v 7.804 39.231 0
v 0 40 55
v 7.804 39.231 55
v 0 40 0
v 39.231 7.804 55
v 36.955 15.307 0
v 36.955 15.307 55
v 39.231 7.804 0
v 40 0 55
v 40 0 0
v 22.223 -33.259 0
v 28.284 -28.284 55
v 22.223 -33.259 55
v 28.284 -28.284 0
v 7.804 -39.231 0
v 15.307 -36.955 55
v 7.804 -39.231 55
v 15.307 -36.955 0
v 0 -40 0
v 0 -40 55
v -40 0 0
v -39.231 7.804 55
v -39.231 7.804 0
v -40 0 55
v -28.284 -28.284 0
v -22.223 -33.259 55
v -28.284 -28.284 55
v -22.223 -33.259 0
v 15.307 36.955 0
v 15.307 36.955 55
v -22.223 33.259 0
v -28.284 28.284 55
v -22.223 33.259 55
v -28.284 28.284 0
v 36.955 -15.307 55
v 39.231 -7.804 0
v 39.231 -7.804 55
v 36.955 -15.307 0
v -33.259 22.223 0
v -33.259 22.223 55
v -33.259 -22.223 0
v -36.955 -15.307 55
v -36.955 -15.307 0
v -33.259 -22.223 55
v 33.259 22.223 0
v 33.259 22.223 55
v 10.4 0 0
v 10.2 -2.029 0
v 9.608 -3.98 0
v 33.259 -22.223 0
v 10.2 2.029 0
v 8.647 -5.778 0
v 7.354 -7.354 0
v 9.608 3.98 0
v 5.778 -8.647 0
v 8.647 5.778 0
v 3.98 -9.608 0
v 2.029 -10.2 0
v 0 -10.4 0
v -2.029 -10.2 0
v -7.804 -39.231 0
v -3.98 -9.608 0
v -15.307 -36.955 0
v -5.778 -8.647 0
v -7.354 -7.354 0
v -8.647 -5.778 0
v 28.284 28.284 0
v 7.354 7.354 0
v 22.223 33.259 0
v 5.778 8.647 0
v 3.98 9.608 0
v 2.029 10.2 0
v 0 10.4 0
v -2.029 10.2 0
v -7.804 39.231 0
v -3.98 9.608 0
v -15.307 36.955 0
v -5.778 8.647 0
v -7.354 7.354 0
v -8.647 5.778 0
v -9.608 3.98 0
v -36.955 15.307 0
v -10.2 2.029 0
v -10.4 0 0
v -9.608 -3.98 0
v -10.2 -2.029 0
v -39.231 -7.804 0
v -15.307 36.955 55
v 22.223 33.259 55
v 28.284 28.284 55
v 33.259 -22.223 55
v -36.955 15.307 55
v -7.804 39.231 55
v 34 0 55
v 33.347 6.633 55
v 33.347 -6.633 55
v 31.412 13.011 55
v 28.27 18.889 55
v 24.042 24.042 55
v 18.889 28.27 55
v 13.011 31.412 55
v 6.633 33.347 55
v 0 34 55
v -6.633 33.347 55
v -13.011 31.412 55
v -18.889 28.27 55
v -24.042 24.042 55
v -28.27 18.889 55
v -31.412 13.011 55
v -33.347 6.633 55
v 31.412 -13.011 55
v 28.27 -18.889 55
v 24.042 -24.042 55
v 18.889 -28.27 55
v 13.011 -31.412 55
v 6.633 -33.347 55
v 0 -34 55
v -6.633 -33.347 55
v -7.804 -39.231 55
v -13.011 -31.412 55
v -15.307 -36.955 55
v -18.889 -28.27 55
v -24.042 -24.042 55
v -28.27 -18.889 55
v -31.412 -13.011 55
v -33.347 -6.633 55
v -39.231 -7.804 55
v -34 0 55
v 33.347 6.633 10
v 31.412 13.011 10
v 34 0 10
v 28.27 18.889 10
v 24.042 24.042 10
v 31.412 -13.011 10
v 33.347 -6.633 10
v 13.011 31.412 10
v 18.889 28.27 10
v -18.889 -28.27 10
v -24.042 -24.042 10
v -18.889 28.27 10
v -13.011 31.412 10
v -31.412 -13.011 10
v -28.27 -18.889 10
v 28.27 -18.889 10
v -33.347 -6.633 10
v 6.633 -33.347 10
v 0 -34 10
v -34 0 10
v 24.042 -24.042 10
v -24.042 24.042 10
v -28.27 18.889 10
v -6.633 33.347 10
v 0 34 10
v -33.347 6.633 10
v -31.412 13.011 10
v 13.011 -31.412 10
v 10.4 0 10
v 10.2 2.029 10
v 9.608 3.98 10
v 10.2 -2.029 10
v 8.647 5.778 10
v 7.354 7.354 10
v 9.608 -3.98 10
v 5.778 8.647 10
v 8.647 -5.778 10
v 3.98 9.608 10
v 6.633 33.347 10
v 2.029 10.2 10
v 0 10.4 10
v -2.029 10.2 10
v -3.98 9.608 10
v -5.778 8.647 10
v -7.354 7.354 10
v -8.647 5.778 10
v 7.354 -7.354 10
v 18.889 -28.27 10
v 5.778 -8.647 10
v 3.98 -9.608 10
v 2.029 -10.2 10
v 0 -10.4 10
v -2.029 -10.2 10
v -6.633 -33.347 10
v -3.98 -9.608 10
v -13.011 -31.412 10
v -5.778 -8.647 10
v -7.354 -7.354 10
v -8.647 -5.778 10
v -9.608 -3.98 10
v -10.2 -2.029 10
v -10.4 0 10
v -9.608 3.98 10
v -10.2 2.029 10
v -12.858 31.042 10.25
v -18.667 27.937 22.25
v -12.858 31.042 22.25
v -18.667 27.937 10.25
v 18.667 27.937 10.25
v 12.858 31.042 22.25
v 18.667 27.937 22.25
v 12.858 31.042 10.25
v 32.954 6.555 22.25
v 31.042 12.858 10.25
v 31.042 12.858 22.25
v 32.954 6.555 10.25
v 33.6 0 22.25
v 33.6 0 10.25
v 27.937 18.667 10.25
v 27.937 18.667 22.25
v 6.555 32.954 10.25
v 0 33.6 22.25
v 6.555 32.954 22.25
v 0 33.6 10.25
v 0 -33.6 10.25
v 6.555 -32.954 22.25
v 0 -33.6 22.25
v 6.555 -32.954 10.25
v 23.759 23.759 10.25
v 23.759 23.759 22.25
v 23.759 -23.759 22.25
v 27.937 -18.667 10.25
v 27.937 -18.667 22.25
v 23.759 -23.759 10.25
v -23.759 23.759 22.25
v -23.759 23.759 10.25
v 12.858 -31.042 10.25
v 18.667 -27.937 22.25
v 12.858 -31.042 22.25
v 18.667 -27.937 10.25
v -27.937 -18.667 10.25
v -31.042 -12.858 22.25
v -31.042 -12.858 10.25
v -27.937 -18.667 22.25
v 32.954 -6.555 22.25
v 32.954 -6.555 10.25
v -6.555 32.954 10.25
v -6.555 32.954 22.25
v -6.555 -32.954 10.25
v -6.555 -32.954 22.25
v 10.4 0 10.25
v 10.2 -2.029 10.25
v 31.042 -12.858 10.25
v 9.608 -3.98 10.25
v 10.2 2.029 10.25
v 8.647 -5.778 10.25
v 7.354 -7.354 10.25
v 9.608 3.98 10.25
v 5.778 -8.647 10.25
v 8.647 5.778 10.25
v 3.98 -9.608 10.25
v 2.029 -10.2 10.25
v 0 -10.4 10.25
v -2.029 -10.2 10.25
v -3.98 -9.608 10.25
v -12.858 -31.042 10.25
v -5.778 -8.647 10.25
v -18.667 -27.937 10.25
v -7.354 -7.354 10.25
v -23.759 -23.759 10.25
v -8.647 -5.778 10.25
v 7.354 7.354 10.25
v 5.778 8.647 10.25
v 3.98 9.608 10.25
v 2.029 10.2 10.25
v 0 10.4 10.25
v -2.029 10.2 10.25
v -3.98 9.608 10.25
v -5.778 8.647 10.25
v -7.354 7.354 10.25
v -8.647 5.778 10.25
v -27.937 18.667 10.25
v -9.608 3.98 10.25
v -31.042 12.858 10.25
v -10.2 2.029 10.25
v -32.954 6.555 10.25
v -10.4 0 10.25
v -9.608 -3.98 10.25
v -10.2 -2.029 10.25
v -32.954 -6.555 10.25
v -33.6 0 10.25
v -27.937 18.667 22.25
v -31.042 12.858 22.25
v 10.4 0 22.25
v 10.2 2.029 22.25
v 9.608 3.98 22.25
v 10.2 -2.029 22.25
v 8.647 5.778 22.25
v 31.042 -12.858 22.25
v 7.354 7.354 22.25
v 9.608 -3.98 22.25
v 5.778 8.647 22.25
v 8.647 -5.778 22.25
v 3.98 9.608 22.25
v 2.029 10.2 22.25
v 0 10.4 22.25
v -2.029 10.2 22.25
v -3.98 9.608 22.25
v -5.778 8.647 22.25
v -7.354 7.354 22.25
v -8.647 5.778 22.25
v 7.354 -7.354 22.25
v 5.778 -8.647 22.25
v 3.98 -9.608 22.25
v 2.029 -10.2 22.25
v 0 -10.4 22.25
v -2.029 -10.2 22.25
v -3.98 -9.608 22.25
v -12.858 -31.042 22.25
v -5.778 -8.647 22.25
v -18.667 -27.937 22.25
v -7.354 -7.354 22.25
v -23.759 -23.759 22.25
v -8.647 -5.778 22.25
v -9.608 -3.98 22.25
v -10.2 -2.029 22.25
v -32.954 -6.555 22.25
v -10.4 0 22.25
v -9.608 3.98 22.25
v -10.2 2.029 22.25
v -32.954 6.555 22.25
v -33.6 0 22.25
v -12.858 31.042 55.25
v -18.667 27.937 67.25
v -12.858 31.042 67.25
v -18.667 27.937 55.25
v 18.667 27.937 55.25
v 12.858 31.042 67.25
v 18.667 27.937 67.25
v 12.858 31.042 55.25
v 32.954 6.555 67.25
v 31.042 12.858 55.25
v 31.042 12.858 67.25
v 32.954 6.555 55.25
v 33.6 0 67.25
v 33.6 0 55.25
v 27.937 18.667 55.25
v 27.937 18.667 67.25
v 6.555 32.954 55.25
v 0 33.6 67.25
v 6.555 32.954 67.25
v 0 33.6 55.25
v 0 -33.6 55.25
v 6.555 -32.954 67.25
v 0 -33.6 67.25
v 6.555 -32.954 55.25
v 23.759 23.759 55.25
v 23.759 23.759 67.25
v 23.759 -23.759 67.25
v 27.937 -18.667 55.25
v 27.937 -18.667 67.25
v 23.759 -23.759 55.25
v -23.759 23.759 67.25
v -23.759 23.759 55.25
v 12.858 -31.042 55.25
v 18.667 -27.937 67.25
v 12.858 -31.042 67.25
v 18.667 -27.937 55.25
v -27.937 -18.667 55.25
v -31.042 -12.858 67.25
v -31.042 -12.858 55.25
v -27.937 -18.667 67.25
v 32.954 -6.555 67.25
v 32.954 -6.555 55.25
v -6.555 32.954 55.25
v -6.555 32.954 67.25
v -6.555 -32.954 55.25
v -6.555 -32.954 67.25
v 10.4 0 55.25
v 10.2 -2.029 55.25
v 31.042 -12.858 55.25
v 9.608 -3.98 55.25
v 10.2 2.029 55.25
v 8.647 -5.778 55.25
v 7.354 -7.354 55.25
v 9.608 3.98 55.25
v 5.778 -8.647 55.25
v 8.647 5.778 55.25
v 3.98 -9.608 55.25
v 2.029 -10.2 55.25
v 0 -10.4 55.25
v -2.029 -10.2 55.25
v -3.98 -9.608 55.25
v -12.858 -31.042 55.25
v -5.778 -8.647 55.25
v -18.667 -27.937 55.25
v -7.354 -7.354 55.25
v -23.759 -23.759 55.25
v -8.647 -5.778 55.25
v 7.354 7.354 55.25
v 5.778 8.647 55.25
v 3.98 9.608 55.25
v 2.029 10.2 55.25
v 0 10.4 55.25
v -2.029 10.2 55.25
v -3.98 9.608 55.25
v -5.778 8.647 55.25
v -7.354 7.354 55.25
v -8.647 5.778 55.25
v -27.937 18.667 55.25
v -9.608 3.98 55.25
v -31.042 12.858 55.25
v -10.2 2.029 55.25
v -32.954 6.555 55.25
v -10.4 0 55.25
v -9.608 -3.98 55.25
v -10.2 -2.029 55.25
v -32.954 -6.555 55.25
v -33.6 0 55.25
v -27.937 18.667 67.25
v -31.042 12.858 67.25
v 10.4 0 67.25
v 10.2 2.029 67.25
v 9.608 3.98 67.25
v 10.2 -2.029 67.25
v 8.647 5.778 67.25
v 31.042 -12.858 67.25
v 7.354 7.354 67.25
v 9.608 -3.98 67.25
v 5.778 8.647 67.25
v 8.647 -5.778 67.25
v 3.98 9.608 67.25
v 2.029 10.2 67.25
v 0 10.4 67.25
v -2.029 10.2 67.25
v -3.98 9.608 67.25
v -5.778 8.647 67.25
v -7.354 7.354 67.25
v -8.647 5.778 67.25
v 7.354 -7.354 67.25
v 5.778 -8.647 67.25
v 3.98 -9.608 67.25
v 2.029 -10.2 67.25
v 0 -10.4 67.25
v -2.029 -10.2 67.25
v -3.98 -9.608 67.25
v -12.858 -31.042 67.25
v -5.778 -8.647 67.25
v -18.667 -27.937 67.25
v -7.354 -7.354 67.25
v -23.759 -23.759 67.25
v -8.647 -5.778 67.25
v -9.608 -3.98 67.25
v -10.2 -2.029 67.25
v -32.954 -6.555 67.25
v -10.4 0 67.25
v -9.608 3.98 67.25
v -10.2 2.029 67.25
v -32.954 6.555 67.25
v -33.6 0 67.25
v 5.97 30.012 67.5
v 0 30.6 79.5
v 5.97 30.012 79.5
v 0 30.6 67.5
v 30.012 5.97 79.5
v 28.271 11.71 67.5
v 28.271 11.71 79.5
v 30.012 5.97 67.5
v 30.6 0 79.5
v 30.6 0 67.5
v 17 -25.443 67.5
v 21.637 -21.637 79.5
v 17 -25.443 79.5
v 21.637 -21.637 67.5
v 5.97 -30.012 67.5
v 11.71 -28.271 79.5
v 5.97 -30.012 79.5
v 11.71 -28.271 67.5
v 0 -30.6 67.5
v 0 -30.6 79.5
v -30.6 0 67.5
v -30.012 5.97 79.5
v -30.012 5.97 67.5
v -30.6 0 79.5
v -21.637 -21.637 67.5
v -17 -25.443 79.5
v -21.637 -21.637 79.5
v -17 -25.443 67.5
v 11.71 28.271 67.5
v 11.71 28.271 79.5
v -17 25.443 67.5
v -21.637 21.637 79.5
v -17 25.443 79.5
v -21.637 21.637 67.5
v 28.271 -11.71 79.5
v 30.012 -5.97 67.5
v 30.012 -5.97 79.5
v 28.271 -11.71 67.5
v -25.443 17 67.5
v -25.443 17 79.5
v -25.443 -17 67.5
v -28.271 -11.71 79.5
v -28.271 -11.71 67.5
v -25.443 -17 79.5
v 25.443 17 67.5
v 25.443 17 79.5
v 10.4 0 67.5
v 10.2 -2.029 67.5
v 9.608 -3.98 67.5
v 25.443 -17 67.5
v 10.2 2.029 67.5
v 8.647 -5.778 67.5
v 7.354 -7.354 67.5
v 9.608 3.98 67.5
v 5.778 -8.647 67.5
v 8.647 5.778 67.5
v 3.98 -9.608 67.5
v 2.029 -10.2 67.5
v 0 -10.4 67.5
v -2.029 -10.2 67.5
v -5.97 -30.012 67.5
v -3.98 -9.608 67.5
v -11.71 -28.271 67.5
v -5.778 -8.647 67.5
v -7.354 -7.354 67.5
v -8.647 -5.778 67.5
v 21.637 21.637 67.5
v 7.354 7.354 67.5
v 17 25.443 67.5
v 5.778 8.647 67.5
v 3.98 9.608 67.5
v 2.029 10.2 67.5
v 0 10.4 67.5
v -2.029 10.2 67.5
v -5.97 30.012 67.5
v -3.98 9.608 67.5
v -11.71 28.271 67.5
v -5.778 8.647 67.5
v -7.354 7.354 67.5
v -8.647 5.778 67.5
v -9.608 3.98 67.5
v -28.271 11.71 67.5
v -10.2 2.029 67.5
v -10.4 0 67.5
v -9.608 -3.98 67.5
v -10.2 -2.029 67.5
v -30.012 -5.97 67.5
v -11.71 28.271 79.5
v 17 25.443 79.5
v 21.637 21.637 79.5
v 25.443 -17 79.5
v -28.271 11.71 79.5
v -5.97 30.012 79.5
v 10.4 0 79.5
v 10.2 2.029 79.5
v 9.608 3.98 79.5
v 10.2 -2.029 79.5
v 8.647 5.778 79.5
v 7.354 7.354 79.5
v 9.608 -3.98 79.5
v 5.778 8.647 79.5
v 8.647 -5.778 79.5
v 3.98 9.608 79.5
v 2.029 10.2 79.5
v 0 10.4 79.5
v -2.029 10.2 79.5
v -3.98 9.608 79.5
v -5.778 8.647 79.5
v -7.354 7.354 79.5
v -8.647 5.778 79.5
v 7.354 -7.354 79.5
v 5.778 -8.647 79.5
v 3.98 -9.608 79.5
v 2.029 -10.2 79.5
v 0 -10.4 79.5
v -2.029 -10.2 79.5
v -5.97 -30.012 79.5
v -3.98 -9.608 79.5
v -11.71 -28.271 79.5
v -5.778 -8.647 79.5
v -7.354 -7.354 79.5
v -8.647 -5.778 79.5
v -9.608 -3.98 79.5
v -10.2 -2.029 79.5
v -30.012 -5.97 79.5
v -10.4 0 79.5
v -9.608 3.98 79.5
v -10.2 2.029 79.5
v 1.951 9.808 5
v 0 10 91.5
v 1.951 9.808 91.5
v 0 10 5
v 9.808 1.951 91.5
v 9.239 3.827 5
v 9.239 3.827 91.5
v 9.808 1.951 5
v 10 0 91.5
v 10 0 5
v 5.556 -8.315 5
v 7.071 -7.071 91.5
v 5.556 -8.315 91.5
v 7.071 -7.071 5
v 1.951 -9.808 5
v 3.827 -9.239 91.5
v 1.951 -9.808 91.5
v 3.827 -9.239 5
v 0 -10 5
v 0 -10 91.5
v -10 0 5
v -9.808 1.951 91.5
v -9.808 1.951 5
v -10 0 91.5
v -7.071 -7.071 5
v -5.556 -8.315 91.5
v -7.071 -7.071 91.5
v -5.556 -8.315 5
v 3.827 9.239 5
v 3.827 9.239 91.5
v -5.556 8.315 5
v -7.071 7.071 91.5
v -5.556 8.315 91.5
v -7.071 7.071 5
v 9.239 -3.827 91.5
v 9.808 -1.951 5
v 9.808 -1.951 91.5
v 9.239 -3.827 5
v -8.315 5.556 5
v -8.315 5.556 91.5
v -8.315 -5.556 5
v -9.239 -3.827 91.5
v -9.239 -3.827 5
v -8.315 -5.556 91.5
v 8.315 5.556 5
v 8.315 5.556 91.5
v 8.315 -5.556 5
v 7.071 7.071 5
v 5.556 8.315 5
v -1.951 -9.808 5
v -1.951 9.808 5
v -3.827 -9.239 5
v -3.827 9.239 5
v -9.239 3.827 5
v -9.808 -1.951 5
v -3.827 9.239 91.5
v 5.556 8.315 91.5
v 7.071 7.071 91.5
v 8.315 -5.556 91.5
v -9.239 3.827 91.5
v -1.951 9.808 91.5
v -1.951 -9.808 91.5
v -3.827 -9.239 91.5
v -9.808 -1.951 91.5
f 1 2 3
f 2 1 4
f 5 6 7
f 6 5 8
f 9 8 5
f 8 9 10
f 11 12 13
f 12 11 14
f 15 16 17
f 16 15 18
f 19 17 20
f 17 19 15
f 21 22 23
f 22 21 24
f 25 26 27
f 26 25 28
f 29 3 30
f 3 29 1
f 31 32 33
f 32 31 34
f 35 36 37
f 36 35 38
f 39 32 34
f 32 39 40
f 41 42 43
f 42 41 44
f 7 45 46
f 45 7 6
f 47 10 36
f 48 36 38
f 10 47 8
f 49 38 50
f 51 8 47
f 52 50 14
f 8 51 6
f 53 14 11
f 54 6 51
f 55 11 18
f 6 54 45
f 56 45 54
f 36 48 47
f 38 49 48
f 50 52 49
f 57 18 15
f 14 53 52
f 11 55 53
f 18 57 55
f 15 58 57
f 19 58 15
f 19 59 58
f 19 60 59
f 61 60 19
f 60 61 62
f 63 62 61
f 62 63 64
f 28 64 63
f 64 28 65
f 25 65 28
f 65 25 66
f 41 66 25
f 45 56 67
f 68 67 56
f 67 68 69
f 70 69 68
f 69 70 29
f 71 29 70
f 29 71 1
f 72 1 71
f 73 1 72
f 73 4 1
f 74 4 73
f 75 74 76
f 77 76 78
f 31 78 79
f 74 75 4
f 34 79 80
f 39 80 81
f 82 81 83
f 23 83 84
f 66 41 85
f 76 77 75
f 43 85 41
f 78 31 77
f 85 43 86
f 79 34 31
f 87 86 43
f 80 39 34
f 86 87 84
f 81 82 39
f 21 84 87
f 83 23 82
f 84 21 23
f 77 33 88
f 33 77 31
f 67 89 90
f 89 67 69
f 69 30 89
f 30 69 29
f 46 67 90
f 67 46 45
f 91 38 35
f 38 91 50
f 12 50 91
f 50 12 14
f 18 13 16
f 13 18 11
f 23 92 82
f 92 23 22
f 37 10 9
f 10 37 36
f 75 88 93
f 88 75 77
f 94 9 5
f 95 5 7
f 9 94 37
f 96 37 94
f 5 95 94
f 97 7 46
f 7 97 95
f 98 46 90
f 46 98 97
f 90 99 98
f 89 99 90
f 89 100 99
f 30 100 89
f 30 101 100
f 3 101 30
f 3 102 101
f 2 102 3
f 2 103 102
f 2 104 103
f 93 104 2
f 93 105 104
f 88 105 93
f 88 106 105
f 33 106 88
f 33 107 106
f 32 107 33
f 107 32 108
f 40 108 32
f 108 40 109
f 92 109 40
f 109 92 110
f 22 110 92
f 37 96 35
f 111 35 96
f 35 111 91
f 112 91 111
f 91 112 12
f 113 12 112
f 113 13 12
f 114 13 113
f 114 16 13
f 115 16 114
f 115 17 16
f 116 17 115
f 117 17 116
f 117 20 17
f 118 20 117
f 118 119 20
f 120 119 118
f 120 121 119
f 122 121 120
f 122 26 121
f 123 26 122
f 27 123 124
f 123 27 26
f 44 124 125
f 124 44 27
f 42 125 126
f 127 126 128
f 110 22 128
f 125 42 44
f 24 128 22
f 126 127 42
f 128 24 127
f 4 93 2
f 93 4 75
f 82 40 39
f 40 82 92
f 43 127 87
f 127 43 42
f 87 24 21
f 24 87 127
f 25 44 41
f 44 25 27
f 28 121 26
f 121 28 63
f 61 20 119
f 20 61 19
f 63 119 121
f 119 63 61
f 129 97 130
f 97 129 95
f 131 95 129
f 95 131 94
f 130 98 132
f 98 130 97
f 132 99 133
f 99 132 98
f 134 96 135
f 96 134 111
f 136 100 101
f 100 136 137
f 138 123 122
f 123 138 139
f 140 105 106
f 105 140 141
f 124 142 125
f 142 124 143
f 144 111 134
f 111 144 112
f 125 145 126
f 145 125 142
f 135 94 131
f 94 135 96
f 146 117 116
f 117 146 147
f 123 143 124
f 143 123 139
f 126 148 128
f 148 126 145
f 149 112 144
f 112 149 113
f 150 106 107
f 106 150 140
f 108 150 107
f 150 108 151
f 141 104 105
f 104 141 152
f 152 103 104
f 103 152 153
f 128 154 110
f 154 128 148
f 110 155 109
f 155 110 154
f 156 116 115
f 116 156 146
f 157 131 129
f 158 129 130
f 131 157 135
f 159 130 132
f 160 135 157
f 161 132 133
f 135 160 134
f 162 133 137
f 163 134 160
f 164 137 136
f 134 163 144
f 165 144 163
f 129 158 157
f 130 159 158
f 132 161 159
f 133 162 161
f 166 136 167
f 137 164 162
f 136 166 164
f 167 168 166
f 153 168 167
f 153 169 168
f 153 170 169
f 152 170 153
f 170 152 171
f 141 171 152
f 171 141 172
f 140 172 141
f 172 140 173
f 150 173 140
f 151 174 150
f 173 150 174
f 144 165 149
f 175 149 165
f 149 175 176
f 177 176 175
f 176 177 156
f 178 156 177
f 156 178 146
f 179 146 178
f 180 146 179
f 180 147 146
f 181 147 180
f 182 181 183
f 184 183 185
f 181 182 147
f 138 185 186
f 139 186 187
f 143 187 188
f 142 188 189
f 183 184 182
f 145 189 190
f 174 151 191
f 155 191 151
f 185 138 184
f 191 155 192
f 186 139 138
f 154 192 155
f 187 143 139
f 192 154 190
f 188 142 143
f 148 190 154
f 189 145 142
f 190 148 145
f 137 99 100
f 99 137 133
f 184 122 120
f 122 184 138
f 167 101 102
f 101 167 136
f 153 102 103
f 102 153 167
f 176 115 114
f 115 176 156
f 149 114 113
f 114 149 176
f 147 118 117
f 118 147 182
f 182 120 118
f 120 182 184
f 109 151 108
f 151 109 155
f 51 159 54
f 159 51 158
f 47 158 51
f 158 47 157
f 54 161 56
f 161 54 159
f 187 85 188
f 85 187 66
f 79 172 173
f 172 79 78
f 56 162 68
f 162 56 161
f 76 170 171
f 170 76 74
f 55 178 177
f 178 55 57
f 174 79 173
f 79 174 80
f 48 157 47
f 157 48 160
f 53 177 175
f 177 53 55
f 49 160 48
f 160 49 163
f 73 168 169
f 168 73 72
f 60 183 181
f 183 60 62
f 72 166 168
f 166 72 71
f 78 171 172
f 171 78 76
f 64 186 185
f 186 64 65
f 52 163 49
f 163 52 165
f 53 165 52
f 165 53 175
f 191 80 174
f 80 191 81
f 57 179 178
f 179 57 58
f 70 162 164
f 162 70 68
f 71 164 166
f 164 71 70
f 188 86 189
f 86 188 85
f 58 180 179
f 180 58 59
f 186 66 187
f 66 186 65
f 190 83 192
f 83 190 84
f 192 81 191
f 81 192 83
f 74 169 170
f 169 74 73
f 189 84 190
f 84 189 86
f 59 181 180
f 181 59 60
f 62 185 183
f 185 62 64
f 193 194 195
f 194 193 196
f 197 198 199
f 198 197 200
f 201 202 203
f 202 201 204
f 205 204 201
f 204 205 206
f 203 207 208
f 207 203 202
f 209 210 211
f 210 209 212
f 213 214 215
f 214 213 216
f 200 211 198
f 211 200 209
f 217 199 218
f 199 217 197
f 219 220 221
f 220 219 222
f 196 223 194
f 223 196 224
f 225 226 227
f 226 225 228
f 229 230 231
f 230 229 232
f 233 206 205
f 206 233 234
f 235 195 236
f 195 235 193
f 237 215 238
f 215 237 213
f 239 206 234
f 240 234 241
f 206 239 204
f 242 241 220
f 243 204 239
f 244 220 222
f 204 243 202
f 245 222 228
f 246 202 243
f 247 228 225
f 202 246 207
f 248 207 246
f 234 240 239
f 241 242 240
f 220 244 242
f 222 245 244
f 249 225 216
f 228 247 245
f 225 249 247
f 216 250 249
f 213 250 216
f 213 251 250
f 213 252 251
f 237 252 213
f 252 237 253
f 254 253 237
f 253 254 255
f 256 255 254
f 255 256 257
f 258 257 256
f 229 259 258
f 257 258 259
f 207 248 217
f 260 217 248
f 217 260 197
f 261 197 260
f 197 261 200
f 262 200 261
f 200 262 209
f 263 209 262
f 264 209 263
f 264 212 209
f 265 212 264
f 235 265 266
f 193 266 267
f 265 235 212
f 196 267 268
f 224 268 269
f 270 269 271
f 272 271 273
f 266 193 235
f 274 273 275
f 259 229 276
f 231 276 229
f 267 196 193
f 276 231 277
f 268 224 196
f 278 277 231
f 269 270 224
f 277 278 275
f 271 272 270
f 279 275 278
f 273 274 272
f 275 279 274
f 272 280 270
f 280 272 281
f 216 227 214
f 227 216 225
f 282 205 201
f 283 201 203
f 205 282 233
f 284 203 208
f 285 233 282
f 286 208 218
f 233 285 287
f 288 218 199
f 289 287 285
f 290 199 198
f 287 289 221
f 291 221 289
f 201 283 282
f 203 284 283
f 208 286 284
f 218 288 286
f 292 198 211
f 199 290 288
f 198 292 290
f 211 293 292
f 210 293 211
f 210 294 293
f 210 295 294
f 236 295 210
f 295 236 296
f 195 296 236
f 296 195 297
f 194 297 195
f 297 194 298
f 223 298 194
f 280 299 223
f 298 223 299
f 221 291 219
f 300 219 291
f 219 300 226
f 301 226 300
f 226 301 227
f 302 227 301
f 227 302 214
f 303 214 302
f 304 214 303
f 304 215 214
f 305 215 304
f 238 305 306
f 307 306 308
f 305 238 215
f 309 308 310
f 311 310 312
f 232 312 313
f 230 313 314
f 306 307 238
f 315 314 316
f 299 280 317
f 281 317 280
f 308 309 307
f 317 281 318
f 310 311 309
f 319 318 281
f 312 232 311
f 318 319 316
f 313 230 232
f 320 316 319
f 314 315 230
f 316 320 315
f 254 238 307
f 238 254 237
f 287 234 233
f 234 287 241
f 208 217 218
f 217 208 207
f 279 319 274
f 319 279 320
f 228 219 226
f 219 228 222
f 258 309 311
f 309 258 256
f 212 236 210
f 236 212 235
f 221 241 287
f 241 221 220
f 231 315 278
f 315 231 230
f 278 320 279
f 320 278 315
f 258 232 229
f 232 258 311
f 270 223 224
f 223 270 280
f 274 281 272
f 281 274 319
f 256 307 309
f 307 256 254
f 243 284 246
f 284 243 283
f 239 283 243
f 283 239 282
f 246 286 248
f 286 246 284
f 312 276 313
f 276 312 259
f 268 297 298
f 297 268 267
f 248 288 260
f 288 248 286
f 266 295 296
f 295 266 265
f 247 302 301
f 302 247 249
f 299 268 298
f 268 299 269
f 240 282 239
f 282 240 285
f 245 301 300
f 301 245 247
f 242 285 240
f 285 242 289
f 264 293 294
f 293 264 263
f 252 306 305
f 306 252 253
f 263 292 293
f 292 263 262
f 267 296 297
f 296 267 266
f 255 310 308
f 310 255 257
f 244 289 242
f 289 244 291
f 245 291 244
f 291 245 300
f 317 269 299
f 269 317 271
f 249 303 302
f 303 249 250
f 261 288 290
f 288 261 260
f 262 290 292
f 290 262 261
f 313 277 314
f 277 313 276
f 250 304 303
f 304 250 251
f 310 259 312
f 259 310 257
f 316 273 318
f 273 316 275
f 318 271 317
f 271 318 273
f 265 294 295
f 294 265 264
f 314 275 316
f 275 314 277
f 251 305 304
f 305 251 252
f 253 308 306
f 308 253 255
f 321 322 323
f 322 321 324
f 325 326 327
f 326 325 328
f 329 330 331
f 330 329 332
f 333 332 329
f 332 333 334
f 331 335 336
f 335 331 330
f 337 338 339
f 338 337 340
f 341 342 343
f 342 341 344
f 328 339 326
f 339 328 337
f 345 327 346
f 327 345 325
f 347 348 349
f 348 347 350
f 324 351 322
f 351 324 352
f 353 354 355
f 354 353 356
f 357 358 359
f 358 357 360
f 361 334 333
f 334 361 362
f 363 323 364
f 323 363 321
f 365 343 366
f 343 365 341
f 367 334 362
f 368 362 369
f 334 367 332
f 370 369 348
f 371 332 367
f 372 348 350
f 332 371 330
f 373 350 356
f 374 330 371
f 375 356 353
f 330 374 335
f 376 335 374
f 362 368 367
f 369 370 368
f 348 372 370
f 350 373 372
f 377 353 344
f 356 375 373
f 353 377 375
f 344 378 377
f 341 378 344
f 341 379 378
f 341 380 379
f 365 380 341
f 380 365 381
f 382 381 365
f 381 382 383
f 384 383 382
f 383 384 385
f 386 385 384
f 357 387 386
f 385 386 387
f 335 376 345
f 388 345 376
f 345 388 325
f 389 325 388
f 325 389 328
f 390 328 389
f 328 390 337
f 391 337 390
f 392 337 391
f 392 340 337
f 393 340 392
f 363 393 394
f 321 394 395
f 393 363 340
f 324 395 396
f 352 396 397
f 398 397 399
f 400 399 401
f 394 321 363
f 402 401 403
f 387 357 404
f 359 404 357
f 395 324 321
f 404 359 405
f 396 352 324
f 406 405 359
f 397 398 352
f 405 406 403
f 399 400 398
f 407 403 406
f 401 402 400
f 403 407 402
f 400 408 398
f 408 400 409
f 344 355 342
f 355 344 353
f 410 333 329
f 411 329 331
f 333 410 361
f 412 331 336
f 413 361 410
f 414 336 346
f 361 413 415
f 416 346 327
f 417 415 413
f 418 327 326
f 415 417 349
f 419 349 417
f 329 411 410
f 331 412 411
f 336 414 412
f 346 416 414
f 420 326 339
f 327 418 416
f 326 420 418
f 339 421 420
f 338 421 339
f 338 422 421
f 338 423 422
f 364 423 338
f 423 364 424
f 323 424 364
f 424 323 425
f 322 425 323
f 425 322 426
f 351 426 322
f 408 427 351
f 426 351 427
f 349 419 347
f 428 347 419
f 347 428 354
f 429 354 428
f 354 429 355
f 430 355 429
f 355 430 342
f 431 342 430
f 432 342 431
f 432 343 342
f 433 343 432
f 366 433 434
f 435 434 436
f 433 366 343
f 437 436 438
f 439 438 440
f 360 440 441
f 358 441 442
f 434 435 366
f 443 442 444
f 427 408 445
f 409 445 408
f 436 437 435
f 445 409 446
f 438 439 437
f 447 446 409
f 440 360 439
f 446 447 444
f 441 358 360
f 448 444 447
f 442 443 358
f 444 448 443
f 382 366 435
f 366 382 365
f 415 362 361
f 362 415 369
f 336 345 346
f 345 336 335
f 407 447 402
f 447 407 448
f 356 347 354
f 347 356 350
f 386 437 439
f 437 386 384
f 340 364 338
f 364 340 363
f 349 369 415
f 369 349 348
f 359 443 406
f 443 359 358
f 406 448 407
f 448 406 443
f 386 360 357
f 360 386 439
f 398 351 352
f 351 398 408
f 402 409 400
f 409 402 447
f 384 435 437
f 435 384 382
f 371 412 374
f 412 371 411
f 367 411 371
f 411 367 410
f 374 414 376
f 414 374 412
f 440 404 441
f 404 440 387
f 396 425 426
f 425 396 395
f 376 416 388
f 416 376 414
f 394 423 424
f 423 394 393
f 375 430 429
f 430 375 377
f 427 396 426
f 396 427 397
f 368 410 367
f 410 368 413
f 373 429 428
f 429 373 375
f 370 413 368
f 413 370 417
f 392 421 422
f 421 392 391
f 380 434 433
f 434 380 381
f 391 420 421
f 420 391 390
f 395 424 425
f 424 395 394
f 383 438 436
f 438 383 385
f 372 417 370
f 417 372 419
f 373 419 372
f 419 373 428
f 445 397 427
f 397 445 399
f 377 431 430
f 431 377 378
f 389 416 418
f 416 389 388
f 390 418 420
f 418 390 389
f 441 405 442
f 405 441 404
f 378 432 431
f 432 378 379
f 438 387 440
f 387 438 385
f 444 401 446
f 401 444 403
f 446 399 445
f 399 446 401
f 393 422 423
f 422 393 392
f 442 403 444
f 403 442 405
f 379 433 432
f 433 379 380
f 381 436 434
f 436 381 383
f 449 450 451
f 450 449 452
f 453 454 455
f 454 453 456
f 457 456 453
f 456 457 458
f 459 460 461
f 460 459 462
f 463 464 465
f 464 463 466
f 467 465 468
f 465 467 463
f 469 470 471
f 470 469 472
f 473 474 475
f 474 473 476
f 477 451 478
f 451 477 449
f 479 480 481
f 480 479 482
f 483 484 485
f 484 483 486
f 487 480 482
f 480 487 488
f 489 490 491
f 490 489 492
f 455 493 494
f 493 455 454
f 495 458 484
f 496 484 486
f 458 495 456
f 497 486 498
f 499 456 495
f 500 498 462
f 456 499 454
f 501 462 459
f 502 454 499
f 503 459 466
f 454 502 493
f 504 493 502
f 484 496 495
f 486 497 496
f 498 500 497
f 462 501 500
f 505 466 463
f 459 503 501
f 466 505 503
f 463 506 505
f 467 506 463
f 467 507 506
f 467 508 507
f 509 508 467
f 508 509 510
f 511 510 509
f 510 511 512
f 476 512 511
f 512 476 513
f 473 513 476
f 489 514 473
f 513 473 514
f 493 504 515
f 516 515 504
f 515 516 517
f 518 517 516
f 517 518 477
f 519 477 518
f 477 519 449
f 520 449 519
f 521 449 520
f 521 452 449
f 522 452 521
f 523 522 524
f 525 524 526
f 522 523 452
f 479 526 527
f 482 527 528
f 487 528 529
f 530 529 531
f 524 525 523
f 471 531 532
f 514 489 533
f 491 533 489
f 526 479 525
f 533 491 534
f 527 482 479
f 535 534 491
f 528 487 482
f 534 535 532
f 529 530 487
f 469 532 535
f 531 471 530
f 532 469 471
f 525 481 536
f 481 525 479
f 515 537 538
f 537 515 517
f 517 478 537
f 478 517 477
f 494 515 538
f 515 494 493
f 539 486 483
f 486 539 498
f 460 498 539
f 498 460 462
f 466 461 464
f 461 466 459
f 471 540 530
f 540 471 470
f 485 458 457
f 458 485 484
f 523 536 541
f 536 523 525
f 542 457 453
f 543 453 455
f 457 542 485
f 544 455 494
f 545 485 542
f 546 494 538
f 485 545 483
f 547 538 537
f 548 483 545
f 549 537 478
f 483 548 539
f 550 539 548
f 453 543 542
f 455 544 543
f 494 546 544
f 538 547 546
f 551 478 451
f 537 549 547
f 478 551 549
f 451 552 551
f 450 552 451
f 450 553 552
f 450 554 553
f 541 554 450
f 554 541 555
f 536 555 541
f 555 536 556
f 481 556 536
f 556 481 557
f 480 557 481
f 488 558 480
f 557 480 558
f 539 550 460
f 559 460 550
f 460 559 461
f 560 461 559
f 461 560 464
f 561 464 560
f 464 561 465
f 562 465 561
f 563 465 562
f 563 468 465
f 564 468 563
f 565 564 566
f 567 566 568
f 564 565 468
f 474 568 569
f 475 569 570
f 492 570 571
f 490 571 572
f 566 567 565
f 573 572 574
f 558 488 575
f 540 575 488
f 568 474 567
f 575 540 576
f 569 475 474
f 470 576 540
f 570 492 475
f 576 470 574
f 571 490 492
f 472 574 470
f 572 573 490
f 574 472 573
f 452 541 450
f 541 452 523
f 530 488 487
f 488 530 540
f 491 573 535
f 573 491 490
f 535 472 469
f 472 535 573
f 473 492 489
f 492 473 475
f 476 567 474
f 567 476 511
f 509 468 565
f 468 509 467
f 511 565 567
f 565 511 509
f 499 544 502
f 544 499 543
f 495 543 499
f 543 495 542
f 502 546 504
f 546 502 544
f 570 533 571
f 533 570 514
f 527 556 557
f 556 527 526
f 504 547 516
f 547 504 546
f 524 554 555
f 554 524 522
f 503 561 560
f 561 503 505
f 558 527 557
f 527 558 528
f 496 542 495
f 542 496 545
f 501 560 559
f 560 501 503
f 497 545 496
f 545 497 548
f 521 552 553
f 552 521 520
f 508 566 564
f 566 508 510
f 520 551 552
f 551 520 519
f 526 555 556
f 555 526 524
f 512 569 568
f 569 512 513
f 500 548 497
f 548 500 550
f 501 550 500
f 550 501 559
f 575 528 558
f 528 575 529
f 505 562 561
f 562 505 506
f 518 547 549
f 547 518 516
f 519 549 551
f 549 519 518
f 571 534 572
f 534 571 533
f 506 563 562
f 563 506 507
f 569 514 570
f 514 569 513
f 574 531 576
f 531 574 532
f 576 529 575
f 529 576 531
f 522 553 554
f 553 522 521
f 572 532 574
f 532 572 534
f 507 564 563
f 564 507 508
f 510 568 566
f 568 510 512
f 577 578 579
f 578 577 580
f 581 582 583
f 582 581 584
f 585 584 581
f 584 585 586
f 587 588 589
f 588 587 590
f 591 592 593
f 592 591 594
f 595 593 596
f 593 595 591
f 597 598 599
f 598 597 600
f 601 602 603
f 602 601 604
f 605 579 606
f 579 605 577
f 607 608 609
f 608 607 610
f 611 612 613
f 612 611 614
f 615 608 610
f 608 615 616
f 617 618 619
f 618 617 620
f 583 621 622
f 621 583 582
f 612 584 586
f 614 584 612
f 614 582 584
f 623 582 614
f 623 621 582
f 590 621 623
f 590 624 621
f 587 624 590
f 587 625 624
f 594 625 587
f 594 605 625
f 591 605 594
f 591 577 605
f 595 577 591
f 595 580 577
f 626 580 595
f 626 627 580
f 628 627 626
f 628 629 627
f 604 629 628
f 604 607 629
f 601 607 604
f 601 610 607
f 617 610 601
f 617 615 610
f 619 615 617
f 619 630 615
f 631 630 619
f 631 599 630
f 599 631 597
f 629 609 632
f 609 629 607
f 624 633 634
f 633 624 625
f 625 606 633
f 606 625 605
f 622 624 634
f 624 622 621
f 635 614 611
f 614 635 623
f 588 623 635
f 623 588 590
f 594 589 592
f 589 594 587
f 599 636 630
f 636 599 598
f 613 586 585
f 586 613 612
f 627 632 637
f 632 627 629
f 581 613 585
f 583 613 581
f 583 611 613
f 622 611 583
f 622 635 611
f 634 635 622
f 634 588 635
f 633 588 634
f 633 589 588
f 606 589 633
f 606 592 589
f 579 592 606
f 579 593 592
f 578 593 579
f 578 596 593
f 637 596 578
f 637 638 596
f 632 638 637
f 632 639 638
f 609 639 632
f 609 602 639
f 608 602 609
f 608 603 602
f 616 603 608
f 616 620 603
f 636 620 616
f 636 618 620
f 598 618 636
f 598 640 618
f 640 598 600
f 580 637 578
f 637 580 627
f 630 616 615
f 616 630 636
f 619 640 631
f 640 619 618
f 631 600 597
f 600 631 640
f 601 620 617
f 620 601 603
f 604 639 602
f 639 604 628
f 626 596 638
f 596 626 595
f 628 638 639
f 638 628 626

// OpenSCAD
$fn = 32;

// ------------------------------------------------------------------------
// Bearing housing: housing d80, two bearings and a shaft
// Every part is its own module, assembly() places them once.
// ------------------------------------------------------------------------

// --- part 1 ---
module housing() {
  difference() {
    cylinder(h = 55, d = 80);
    translate([0, 0, 10]) cylinder(h = 46, d = 68);
    translate([0, 0, -1]) cylinder(h = 12, d = 20.8);
  }
}

// --- part 2 ---
module bearing_lower() {
  difference() {
      translate([0, 0, 0]) cylinder(h = 12, d = 67.2);
      translate([0, 0, -1]) cylinder(h = 14, d = 20.8);
    }
}

// --- part 3 ---
module bearing_upper() {
  difference() {
      translate([0, 0, 0]) cylinder(h = 12, d = 67.2);
      translate([0, 0, -1]) cylinder(h = 14, d = 20.8);
    }
}

// --- part 4 ---
module spacer() {
  difference() {
      translate([0, 0, 0]) cylinder(h = 12, d = 61.2);
      translate([0, 0, -1]) cylinder(h = 14, d = 20.8);
    }
}

// --- part 5 ---
module shaft() {
  translate([0, 0, -43.25]) cylinder(h = 86.5, d = 20);
}

// --- assembly ---
module assembly() {
  translate([0, 0, 0]) rotate([0, 0, 0]) housing();
  translate([0, 0, 10.25]) rotate([0, 0, 0]) bearing_lower();
  translate([0, 0, 55.25]) rotate([0, 0, 0]) bearing_upper();
  translate([0, 0, 67.5]) rotate([0, 0, 0]) spacer();
  translate([0, 0, 48.25]) rotate([0, 0, 0]) shaft();
}

assembly();
